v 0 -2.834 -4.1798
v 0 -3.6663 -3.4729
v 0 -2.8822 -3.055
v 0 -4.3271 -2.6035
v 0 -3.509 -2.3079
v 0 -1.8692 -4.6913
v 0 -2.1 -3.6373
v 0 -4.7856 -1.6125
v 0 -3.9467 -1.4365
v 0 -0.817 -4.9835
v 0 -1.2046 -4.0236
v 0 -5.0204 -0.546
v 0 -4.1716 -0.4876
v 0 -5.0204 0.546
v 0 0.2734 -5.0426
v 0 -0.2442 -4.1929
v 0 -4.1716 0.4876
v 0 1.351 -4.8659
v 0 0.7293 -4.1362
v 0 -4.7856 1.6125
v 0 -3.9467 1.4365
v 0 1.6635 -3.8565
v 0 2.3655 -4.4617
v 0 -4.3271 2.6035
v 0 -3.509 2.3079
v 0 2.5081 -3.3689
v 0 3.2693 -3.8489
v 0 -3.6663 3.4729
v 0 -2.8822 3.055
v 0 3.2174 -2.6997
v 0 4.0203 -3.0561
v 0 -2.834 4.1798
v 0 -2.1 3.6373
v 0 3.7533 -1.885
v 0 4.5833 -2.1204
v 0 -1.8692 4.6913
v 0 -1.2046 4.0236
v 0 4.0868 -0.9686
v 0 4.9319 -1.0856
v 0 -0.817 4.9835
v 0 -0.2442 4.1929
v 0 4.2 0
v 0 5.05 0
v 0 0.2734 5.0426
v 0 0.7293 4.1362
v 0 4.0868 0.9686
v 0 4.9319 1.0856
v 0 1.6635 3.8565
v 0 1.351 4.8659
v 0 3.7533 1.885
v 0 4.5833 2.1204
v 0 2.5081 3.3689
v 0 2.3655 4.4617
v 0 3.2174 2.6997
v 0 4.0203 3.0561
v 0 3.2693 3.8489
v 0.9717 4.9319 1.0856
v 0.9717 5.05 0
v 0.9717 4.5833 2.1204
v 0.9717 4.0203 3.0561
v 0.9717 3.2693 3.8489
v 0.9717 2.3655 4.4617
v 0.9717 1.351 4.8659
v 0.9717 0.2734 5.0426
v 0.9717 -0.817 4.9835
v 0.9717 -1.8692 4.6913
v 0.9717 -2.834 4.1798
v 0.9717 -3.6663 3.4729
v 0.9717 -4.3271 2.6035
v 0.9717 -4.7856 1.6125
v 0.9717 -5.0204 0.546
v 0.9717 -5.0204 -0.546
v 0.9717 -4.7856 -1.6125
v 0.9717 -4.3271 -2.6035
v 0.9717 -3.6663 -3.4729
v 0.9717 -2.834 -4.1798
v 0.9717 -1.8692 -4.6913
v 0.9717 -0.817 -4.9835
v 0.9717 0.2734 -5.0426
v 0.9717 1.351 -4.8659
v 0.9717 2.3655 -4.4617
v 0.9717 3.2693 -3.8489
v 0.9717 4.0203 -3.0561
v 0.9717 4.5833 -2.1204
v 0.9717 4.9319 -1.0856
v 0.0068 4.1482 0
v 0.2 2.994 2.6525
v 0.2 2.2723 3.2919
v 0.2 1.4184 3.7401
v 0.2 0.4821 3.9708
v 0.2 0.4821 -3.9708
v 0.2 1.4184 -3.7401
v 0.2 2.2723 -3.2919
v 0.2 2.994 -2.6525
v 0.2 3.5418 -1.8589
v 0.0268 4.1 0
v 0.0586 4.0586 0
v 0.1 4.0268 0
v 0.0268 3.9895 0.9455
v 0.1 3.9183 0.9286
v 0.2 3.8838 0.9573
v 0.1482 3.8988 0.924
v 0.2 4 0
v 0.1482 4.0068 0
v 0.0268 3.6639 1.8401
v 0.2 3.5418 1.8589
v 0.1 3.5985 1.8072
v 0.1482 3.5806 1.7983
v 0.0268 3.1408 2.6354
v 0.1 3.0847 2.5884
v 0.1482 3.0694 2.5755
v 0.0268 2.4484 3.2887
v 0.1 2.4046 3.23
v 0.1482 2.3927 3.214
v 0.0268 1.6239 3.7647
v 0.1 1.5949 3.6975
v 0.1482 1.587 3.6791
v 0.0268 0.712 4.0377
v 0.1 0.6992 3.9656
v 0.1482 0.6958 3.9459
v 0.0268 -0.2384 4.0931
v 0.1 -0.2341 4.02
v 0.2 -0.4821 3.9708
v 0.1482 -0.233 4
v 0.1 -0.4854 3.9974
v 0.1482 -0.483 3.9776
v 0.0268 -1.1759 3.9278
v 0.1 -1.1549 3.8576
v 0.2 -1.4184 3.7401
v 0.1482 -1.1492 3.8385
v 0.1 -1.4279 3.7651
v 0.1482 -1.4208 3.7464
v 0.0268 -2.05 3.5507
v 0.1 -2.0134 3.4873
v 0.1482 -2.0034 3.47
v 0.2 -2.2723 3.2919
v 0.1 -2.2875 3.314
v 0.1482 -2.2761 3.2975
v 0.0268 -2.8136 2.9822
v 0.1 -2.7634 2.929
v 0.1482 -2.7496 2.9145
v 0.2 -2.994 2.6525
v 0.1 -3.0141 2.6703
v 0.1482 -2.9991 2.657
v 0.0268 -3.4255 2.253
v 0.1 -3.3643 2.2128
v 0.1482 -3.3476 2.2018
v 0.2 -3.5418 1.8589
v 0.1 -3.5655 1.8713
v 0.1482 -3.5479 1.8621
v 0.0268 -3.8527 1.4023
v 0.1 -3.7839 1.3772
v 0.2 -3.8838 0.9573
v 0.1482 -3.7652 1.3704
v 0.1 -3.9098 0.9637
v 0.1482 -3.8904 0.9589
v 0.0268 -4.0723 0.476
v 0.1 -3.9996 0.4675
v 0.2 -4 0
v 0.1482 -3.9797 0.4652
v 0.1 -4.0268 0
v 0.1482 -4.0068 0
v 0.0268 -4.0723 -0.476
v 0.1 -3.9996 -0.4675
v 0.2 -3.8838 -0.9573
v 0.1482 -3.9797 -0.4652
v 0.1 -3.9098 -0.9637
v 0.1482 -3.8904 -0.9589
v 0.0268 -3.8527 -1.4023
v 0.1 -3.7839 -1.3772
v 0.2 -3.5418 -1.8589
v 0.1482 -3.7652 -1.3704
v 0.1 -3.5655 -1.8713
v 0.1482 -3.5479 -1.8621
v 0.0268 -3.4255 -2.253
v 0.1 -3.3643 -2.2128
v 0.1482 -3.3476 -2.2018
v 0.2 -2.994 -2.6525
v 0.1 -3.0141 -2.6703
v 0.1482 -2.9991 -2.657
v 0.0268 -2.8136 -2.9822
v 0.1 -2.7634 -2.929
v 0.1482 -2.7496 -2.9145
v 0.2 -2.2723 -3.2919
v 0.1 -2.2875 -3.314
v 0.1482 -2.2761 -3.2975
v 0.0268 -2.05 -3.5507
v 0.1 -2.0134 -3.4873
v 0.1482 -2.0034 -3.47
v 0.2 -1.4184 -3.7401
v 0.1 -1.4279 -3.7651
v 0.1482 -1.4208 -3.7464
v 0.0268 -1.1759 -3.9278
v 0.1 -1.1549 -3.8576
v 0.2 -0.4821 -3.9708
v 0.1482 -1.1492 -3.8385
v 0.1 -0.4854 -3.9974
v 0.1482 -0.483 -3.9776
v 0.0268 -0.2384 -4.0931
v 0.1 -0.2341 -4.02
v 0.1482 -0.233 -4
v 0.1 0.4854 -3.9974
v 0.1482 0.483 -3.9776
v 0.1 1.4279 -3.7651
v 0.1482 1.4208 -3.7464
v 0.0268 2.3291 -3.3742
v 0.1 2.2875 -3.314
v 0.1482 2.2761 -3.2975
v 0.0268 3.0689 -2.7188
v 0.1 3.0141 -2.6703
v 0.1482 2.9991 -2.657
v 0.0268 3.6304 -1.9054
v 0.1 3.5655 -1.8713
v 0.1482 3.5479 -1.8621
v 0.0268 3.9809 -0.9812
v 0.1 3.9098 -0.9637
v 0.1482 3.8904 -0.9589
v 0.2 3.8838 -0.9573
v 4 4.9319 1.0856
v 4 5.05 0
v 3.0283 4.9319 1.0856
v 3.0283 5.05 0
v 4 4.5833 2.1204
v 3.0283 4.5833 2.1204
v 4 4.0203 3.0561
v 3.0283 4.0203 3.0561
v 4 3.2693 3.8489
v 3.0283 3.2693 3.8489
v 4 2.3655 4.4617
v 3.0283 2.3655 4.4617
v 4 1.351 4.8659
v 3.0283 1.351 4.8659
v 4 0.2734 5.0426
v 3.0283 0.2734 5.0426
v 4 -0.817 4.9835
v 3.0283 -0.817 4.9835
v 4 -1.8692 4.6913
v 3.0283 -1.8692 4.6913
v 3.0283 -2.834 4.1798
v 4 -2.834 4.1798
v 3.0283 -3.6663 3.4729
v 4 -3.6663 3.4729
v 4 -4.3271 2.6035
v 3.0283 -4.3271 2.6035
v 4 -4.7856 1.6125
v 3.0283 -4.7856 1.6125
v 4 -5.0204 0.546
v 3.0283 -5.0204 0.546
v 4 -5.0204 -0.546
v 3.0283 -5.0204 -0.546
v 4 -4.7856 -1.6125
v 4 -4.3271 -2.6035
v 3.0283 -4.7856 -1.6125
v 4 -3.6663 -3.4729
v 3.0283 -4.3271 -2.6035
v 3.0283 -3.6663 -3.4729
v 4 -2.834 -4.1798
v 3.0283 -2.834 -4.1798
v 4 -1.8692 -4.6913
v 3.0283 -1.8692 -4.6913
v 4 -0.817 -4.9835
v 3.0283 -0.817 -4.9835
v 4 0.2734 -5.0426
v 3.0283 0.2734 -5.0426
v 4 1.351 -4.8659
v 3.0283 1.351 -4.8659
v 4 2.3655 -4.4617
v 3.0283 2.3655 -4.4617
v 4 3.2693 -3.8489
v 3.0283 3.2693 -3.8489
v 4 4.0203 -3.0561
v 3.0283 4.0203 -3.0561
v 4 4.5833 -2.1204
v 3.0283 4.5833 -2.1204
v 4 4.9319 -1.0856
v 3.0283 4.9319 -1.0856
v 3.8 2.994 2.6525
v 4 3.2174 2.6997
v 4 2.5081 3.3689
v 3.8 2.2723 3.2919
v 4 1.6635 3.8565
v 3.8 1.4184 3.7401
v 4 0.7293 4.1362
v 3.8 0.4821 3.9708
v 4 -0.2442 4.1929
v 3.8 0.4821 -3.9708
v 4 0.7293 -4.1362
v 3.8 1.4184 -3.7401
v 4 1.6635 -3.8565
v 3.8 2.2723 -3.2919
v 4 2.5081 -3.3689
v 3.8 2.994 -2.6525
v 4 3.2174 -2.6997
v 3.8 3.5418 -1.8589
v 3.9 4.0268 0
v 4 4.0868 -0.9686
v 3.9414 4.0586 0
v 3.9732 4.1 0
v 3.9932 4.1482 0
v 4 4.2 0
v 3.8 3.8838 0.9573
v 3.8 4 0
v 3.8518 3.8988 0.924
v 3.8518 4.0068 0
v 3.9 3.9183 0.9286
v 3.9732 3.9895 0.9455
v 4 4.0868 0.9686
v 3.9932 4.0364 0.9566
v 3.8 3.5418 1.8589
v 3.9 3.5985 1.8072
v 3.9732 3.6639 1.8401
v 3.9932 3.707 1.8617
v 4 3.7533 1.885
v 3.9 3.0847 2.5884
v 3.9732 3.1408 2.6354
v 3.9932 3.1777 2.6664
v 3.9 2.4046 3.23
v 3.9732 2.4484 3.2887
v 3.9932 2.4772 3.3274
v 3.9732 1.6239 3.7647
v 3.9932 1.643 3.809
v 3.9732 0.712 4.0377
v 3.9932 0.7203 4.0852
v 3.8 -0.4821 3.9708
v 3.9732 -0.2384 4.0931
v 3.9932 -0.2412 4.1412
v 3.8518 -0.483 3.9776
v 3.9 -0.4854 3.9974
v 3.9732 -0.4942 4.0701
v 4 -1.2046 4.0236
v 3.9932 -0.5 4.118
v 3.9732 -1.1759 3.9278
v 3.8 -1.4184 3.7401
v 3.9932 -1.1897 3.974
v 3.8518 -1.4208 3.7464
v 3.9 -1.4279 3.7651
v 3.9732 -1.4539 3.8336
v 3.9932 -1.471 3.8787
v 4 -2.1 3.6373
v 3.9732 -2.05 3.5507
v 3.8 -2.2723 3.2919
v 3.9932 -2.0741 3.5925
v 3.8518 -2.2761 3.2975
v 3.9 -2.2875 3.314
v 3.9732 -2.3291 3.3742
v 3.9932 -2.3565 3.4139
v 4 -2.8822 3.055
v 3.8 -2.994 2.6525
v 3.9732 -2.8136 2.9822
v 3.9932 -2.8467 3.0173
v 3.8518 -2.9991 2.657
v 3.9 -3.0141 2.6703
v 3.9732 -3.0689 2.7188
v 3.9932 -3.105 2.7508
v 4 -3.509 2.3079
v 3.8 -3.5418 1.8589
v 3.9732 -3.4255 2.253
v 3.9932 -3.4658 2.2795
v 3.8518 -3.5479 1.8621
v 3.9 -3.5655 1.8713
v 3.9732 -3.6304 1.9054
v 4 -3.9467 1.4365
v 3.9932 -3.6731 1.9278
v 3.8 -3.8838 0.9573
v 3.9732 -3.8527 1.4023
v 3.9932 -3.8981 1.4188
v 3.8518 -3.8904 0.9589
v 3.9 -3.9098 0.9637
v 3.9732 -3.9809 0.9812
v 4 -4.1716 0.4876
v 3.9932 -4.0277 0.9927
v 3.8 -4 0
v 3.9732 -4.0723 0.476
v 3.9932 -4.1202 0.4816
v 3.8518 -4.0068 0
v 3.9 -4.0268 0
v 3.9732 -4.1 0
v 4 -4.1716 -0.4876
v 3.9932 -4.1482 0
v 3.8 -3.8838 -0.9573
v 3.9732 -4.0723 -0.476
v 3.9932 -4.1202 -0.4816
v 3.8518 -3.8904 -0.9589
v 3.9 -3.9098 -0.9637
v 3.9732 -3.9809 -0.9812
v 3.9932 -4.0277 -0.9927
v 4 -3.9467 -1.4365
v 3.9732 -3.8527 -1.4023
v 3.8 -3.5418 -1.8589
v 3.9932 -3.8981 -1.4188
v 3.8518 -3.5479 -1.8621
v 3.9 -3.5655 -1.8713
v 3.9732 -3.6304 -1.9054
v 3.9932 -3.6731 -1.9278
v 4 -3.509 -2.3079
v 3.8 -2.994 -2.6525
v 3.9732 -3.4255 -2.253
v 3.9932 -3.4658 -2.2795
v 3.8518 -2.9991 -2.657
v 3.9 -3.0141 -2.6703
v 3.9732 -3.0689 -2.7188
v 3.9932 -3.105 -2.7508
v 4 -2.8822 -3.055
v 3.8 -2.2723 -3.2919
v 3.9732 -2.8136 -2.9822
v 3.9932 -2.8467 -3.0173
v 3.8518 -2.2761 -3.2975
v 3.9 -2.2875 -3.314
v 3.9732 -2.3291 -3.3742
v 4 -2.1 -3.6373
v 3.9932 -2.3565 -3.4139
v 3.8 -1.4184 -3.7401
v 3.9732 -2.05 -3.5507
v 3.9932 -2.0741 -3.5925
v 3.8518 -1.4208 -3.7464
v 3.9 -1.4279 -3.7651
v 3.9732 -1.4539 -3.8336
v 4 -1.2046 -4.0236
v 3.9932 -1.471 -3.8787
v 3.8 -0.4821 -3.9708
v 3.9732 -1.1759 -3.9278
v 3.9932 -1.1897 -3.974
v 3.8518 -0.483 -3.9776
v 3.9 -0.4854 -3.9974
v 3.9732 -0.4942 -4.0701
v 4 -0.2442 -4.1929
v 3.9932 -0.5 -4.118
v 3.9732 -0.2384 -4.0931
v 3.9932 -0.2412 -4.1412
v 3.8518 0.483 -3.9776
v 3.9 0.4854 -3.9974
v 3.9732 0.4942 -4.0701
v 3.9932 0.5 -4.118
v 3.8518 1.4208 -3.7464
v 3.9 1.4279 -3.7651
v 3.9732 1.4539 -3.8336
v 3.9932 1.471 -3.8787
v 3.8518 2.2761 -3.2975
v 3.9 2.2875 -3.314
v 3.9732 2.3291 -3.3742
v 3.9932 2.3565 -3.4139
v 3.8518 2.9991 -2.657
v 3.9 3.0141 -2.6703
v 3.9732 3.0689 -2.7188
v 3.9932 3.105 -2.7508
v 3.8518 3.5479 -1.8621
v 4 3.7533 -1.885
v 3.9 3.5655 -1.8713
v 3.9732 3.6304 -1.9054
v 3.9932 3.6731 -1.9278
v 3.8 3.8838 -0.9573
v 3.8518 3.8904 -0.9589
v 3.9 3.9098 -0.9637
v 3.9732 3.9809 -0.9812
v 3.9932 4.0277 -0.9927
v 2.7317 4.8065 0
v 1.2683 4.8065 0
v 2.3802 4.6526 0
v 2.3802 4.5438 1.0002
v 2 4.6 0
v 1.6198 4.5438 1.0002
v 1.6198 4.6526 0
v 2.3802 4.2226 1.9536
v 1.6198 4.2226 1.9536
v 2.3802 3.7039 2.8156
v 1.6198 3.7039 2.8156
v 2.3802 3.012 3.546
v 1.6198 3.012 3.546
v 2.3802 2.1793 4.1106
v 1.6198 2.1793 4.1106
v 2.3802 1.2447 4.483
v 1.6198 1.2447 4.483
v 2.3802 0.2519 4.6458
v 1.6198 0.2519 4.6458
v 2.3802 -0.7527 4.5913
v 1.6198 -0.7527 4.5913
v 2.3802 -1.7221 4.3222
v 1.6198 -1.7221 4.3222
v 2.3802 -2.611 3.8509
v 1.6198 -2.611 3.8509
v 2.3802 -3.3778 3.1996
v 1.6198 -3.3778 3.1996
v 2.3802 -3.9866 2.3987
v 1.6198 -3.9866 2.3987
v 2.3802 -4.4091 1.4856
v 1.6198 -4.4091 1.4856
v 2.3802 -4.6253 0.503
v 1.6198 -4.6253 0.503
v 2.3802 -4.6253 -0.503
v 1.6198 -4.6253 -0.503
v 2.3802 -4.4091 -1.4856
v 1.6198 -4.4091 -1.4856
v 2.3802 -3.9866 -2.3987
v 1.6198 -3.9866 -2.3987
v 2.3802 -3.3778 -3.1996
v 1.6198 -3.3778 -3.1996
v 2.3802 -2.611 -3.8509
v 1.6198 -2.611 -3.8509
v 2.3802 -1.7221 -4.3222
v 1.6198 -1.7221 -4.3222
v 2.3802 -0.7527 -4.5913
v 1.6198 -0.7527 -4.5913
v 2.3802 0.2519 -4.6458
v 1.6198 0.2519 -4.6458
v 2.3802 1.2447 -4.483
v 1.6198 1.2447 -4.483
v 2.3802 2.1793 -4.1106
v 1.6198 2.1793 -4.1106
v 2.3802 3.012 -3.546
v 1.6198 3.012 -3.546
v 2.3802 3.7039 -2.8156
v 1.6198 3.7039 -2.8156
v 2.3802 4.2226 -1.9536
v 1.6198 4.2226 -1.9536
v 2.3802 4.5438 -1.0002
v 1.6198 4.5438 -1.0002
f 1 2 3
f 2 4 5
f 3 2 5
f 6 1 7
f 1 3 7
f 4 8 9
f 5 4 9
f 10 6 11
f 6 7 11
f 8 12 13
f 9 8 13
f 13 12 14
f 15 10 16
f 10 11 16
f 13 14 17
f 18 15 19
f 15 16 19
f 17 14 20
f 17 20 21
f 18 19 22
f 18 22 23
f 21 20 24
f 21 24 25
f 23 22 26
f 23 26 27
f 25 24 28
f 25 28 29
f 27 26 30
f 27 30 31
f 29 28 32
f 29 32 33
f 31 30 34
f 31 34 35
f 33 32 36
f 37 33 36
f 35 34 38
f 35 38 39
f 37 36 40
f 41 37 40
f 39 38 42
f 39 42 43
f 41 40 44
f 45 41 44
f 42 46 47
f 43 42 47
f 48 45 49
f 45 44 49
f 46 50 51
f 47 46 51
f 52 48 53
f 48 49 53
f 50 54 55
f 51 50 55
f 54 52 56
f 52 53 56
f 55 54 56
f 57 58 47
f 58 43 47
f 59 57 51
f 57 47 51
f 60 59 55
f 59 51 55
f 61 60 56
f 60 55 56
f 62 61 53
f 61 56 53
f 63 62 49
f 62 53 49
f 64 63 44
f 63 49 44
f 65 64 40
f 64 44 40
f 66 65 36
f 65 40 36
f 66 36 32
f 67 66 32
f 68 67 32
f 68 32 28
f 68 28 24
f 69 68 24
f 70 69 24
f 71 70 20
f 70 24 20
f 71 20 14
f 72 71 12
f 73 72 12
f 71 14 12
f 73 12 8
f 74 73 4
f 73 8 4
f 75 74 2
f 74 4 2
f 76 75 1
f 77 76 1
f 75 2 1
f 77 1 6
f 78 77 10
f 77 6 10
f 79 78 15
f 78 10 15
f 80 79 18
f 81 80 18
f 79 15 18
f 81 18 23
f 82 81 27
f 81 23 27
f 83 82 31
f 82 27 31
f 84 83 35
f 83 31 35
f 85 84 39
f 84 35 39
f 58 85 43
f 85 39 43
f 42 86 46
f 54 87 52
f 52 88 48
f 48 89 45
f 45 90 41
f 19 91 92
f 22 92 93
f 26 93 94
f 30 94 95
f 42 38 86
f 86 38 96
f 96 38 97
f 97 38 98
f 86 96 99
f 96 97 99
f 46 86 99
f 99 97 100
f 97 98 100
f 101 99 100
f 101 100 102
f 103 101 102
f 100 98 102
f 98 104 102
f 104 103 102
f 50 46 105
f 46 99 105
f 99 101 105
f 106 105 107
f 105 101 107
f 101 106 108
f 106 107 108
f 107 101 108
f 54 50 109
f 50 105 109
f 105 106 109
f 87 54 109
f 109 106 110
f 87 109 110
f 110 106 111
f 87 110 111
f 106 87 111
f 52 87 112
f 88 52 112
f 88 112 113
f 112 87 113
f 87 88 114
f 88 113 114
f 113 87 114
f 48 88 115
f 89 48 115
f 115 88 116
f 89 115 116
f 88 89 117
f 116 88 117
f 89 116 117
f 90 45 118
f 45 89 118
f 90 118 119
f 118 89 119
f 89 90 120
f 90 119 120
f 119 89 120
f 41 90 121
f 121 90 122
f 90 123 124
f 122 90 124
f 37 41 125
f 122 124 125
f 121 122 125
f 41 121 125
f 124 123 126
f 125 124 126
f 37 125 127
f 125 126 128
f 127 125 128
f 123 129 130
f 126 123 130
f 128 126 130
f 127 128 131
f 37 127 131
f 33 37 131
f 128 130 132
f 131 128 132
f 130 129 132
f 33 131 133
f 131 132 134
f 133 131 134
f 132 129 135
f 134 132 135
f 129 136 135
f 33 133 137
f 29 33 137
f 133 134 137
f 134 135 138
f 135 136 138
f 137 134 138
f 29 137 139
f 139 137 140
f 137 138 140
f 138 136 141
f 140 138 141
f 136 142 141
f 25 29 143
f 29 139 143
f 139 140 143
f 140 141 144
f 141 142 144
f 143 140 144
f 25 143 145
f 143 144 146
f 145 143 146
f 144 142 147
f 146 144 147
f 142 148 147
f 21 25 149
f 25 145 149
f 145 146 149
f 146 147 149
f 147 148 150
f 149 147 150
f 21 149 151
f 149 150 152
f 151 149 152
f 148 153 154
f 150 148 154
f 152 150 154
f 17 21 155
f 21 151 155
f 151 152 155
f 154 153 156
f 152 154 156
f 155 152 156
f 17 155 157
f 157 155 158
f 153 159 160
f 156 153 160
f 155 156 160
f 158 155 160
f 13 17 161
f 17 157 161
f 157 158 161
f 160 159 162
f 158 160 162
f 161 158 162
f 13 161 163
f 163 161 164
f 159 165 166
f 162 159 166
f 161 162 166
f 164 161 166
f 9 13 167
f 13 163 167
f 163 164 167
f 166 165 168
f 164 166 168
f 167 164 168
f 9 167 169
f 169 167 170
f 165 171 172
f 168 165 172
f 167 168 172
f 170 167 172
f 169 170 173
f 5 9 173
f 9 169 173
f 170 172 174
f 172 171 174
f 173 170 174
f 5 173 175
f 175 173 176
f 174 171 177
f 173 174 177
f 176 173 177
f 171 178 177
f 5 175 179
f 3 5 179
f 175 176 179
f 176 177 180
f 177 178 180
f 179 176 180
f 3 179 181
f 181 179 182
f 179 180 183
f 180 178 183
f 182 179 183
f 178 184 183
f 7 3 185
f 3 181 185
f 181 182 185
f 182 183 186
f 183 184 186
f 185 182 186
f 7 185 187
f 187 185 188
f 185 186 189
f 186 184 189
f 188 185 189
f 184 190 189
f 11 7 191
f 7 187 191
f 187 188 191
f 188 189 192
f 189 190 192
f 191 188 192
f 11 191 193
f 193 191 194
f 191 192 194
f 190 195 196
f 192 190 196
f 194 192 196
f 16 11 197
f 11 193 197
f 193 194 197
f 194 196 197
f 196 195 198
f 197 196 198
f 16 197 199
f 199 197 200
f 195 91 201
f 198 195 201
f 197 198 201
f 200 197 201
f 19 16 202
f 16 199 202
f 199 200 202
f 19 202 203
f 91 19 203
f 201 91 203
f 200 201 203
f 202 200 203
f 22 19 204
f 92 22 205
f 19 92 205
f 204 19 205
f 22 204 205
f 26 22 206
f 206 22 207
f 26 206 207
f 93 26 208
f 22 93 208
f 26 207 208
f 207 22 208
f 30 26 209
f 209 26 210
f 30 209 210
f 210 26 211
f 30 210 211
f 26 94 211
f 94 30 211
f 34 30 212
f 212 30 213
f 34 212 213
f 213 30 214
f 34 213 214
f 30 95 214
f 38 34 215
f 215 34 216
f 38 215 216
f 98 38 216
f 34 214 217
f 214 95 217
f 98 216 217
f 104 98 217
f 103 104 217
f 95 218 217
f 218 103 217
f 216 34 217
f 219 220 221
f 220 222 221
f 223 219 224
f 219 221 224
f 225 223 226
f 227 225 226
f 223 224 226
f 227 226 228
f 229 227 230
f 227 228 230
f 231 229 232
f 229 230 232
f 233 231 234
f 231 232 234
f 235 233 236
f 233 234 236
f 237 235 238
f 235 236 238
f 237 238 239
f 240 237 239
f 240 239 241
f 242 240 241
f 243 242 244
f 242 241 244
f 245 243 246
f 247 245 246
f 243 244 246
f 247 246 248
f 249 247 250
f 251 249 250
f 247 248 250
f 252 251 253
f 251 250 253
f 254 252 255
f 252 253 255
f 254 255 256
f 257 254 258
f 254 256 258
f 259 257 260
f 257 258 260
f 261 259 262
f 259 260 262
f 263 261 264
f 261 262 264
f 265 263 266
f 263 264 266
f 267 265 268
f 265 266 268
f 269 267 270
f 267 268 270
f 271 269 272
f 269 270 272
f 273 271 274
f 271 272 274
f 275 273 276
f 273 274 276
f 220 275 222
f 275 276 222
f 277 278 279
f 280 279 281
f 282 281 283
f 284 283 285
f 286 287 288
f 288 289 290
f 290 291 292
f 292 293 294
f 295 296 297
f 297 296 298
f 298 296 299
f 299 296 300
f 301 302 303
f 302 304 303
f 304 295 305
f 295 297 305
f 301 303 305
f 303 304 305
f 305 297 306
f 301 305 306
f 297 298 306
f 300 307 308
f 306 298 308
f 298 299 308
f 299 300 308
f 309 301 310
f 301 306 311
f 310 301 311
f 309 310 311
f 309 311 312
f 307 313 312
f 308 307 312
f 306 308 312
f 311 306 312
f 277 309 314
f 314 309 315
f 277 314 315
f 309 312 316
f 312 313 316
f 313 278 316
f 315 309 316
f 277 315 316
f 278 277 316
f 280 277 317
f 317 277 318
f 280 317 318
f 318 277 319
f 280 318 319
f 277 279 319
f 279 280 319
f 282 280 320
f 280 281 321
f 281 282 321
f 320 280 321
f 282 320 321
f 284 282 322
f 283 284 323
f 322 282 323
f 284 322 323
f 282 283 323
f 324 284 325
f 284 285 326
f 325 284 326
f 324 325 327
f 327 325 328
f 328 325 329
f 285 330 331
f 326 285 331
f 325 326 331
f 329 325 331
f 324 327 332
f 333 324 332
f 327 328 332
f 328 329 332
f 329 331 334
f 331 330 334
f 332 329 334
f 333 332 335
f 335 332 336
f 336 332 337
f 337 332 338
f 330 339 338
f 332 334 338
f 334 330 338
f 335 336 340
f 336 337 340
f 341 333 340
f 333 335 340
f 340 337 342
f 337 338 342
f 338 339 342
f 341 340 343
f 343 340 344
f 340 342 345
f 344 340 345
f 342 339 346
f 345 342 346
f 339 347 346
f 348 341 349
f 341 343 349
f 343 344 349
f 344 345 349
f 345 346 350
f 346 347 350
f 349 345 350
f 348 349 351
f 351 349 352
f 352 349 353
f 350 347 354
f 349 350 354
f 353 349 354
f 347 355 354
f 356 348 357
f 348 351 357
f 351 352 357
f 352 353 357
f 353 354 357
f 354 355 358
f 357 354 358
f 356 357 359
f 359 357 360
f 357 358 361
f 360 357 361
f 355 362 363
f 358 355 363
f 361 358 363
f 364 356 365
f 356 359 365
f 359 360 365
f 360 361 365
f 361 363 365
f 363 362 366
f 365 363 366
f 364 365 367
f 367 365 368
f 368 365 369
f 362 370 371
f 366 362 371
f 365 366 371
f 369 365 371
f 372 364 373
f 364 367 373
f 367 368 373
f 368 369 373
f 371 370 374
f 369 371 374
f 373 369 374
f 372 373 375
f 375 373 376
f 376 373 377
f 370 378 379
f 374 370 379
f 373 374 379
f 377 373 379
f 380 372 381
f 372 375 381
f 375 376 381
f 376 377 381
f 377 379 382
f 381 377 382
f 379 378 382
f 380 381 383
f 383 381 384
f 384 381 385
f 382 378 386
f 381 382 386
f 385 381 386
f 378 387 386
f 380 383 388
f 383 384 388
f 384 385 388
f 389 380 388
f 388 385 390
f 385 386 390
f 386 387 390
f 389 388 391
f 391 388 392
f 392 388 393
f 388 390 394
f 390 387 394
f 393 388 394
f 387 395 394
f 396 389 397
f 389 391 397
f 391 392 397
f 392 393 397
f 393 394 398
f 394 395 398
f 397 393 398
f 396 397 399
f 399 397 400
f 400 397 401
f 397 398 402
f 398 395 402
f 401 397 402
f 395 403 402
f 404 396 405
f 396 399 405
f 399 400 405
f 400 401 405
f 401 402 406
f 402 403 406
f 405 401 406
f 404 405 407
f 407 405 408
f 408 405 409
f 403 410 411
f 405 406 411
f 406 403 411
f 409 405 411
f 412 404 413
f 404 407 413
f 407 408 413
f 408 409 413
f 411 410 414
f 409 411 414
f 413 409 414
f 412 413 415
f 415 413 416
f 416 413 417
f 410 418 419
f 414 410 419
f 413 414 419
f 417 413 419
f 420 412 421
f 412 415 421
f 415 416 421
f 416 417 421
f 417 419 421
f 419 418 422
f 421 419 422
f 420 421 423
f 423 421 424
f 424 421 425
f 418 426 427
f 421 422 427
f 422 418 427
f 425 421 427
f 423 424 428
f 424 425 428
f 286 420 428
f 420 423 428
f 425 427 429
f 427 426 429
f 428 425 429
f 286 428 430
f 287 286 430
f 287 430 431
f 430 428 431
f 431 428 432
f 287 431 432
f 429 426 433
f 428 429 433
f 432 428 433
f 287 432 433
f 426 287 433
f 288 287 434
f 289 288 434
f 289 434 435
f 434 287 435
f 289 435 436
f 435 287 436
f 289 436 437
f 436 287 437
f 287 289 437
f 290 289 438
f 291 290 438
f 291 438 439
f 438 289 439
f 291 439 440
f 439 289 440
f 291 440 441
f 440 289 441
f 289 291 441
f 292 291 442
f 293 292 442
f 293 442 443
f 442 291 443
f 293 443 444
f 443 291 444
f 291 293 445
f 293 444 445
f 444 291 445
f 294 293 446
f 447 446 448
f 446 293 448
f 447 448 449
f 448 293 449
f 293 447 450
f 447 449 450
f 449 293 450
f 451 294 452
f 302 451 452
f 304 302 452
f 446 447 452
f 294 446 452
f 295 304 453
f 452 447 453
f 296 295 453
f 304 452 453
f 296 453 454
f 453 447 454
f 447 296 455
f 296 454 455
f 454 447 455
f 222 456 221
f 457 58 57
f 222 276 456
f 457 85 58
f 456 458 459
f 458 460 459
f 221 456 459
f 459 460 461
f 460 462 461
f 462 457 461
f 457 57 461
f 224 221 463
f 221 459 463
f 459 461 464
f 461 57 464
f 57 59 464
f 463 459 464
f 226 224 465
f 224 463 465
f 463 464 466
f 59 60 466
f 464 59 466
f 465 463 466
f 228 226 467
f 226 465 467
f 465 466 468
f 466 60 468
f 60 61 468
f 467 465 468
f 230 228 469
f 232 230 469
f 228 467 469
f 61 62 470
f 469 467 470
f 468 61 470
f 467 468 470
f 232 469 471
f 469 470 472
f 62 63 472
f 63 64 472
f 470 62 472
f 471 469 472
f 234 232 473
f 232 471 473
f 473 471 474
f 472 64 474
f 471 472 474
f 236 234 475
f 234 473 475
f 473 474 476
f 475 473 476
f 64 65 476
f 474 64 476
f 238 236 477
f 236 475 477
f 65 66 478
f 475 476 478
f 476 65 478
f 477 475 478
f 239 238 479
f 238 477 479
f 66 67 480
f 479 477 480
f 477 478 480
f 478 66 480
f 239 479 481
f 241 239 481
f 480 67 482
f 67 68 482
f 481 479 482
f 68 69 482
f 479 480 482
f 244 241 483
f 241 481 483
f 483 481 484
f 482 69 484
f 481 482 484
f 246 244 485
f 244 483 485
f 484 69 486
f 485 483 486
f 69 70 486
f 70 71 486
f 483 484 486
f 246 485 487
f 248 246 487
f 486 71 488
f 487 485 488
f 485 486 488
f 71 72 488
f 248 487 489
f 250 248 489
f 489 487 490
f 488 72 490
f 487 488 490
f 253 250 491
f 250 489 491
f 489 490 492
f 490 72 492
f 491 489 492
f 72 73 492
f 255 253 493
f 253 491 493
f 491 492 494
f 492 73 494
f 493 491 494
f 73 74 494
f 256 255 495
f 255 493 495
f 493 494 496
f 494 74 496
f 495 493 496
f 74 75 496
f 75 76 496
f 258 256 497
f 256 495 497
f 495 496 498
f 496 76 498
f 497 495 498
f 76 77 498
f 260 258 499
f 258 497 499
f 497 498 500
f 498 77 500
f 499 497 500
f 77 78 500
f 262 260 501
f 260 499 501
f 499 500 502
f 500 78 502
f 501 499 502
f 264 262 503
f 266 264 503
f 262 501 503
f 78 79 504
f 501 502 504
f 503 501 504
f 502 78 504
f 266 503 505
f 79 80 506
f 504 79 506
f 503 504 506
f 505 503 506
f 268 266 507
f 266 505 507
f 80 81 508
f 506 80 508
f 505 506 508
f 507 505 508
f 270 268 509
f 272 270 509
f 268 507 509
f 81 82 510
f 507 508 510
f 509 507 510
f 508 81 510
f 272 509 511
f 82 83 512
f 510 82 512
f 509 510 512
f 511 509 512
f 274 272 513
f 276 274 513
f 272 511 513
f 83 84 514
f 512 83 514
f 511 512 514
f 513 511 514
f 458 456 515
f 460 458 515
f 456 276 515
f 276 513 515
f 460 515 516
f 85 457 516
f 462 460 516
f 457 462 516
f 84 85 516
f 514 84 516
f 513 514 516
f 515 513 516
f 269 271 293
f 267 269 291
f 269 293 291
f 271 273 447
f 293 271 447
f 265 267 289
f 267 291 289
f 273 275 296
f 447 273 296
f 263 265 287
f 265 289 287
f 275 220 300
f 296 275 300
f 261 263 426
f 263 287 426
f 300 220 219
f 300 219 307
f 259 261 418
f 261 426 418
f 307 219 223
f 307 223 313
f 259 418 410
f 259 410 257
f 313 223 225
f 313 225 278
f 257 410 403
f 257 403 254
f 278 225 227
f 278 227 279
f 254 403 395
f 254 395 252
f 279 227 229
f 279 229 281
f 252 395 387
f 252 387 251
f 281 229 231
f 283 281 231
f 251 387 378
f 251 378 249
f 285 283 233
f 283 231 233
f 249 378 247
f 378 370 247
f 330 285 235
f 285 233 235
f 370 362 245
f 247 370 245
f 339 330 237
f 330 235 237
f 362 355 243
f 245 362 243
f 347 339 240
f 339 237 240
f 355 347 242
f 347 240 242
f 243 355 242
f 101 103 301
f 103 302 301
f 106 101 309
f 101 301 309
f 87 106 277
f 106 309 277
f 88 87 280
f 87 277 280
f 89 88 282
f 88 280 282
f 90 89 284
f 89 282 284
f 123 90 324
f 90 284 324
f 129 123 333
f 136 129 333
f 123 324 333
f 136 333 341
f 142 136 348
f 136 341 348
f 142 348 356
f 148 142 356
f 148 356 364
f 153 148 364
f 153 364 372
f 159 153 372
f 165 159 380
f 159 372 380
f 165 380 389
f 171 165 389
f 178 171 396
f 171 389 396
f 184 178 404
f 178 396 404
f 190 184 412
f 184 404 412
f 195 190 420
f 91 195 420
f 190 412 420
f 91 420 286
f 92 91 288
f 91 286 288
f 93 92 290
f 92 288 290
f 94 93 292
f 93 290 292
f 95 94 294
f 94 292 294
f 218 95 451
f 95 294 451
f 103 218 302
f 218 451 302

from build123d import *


with BuildPart() as part:
    # Esquisse1 → Base-Révolution (revolve)
    with BuildSketch(Plane.XY):
        with BuildLine():
            Line((0, 5.05), (0, 4.2))
            ThreePointArc((0, 4.2), (0.058578644, 4.058578644), (0.2, 4))
            Line((0.2, 4), (3.8, 4))
            ThreePointArc((3.8, 4), (3.941421356, 4.058578644), (4, 4.2))
            Line((4, 4.2), (4, 5.05))
            Line((4, 5.05), (3.02834819, 5.05))
            ThreePointArc((3.02834819, 5.05), (2, 4.6), (0.97165181, 5.05))
            Line((0.97165181, 5.05), (0, 5.05))
        make_face()
    revolve(axis=Axis((0, 0, 0), (1, 0, 0)))


solid = part.part
